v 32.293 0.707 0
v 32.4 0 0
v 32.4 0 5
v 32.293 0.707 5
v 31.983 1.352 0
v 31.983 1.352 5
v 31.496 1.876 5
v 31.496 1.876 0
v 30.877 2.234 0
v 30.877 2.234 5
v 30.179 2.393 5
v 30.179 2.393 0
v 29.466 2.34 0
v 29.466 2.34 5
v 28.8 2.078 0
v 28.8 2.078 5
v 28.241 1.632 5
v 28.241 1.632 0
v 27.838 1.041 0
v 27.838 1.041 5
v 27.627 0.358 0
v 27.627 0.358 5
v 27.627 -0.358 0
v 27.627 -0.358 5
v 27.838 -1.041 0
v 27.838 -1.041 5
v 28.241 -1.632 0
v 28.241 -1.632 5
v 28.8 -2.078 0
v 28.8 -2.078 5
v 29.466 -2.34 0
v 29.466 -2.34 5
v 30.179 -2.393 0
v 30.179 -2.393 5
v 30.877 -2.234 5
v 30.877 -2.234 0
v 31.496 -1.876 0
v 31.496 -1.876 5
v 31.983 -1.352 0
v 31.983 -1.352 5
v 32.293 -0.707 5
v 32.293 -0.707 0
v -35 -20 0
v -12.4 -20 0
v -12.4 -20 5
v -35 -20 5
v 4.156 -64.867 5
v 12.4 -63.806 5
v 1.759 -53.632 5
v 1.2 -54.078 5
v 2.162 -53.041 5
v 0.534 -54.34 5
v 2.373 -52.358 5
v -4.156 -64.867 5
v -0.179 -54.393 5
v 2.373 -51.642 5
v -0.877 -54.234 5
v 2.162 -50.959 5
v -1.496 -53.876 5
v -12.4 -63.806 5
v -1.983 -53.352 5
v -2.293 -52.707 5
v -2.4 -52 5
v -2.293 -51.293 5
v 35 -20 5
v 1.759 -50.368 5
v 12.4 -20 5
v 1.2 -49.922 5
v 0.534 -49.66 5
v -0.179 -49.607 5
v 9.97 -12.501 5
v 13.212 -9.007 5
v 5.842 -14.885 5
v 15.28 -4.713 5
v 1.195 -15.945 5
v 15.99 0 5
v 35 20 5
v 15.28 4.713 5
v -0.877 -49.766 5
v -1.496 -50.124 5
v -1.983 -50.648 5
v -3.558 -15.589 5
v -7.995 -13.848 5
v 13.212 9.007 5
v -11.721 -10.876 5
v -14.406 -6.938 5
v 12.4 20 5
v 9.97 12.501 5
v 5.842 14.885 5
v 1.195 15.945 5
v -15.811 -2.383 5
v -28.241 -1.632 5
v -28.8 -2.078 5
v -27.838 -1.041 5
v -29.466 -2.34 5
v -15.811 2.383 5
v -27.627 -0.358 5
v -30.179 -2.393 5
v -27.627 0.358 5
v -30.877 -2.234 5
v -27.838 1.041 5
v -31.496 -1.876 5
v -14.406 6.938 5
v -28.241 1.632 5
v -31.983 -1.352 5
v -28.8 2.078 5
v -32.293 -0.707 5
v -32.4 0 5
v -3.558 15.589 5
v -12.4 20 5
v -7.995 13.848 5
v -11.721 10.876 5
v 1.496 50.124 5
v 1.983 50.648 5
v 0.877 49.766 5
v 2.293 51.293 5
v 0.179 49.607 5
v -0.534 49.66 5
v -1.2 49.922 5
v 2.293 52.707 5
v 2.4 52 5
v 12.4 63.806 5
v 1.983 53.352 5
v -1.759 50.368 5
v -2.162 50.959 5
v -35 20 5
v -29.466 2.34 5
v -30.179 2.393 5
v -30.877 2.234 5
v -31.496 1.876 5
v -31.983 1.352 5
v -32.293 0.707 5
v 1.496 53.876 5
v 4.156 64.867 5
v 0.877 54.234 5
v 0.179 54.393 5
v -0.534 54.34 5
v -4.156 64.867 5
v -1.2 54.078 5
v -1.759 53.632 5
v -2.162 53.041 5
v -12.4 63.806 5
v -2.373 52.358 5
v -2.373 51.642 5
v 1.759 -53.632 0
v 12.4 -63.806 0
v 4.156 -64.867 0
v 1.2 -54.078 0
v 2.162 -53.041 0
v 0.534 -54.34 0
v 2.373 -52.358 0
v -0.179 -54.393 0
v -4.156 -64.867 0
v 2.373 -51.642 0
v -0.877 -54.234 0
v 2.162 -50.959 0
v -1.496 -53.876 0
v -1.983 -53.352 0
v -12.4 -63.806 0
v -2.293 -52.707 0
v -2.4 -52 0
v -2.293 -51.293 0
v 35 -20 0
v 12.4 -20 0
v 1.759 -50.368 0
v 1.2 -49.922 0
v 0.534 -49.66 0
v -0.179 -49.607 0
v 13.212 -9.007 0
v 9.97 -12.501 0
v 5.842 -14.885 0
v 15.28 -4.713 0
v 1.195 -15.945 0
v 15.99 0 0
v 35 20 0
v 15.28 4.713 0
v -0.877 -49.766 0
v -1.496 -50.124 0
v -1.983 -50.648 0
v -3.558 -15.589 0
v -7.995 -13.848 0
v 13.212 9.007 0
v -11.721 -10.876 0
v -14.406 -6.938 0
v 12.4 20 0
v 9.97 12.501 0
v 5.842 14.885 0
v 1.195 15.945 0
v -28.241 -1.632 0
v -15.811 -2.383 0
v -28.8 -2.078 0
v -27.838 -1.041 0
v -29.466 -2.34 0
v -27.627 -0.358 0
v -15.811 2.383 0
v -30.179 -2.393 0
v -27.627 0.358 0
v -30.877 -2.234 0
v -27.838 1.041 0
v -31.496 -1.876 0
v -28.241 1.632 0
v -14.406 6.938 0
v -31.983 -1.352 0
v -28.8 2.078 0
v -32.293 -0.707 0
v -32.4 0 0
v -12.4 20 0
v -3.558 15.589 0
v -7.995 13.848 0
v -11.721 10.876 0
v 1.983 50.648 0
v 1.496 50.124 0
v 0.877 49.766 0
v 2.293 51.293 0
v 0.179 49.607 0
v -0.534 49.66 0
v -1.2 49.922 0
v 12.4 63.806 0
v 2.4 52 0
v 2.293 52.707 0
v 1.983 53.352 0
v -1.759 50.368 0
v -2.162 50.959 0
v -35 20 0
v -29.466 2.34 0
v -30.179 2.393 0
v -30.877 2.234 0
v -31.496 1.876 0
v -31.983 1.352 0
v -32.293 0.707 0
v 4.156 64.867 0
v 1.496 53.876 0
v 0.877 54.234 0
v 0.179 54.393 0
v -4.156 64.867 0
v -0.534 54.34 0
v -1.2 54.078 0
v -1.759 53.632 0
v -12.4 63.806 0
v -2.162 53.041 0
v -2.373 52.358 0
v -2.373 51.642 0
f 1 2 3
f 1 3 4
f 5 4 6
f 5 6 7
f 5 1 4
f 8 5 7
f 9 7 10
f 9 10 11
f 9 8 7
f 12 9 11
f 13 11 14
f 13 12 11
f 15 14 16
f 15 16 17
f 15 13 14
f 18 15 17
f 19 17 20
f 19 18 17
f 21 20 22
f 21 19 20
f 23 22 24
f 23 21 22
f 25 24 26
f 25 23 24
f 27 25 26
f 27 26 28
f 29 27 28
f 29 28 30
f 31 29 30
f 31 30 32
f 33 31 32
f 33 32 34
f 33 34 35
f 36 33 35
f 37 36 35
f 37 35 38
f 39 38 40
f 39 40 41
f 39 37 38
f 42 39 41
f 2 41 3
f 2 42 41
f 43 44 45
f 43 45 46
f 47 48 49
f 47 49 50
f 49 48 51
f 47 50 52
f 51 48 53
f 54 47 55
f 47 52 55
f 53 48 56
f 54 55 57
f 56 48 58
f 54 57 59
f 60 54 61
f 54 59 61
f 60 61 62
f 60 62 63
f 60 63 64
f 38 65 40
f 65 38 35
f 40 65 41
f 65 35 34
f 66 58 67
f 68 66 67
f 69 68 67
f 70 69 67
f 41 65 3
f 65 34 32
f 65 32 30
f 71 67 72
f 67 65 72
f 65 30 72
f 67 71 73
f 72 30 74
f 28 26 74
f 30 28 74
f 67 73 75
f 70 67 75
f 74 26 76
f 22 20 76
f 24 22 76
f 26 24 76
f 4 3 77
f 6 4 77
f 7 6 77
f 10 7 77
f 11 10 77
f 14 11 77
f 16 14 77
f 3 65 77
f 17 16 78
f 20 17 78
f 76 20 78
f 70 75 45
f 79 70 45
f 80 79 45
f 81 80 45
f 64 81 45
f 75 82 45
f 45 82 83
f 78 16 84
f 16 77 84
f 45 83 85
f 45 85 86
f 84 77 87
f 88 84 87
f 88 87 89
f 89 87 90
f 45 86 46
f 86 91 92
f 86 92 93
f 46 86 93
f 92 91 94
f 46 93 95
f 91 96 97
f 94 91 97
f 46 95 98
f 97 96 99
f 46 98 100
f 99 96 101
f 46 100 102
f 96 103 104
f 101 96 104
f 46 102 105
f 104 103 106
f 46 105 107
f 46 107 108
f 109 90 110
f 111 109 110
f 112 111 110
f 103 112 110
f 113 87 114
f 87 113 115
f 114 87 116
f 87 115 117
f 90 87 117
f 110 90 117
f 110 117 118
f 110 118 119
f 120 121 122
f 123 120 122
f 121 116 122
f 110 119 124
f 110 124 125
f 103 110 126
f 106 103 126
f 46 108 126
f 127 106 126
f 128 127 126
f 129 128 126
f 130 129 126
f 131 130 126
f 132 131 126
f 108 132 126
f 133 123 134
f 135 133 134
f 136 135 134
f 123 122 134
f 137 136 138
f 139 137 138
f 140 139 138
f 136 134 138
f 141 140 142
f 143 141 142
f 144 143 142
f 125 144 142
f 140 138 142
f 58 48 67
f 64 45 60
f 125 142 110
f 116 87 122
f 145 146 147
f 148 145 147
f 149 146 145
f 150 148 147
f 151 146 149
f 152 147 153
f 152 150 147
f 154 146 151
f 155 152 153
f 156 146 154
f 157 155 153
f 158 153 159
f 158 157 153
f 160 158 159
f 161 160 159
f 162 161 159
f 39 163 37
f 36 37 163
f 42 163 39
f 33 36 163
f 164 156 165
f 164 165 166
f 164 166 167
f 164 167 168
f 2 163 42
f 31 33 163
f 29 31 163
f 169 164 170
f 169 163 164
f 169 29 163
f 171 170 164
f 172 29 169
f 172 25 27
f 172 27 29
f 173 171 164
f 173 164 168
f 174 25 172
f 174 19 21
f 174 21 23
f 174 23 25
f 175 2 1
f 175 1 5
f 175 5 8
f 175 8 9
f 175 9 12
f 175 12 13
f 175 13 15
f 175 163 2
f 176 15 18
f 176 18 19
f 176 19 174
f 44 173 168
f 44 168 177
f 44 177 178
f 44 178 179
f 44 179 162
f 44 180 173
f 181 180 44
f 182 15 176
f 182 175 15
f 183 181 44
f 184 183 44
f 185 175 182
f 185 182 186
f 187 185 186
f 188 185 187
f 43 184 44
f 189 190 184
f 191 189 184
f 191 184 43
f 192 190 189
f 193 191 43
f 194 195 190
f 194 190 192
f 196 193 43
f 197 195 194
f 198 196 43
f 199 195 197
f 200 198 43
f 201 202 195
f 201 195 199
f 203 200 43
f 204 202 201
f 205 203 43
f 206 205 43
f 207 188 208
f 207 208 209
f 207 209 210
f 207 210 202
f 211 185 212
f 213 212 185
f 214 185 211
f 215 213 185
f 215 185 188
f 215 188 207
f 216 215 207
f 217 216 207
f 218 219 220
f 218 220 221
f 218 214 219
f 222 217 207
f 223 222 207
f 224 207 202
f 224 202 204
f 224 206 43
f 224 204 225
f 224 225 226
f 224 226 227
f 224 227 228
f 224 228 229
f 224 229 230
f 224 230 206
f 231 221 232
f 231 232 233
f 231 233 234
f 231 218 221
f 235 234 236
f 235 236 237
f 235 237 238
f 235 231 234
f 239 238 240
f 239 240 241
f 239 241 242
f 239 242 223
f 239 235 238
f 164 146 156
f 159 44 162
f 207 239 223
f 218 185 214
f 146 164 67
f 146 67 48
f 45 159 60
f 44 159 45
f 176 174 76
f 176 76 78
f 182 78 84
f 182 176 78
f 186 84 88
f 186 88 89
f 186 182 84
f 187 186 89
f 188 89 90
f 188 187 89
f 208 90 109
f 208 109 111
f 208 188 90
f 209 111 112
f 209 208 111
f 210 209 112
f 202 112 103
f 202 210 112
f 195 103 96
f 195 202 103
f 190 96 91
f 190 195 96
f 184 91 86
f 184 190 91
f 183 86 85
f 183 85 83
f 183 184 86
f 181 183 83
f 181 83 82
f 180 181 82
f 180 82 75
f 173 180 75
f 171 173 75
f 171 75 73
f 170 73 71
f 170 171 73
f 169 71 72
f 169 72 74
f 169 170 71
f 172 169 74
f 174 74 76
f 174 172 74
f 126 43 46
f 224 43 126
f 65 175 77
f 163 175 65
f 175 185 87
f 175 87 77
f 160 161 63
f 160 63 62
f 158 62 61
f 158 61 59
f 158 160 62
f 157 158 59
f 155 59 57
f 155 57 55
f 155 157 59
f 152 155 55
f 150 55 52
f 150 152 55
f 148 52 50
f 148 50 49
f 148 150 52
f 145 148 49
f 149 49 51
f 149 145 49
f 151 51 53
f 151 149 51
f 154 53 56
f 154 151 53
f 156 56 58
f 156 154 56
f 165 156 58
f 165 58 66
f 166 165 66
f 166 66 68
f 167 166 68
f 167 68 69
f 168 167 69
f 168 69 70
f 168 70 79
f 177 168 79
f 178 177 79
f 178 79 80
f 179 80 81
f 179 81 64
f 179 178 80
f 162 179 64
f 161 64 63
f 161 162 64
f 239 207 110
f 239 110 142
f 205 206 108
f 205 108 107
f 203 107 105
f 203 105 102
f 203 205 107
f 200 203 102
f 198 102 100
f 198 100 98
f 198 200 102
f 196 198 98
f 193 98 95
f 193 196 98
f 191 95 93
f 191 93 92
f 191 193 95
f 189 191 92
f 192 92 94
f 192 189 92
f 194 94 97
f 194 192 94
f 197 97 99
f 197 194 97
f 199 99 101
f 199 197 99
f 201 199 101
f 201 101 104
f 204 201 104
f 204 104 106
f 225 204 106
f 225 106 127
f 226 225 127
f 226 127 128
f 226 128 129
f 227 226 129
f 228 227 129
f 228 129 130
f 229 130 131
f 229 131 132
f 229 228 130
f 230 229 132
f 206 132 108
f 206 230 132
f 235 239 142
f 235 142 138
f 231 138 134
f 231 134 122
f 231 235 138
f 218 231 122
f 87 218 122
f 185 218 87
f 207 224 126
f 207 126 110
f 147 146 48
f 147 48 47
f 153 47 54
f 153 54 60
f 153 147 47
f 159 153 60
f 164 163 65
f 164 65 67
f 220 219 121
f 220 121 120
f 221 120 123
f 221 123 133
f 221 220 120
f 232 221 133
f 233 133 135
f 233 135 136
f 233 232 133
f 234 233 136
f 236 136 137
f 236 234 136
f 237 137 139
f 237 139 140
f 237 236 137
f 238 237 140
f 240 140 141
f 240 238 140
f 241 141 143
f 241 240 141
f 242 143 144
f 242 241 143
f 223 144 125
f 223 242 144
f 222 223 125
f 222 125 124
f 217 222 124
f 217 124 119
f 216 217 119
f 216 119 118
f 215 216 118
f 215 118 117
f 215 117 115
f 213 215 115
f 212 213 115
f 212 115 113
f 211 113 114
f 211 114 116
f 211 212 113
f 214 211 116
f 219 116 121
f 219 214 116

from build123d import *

# Parameters (mm, degrees)
SKETCH1_R           = 15.99
SKETCH1_R_2         = 2.4
BOSS_EXTRUDE1_DEPTH = 5


with BuildPart() as part:
    # Sketch1 → Boss-Extrude1 (new body)
    with BuildSketch(Plane.XY):
        with BuildLine():
            Line((12.4, 20), (35, 20))
            Line((35, 20), (35, 0))
            Line((35, 0), (35, -20))
            Line((35, -20), (12.4, -20))
            Line((12.4, -20), (12.4, -63.806269284))
            ThreePointArc((12.4, -63.806269284), (0, -65), (-12.4, -63.806269284))
            Line((-12.4, -63.806269284), (-12.4, -20))
            Line((-12.4, -20), (-35, -20))
            Line((-35, -20), (-35, 20))
            Line((-35, 20), (-12.4, 20))
            Line((-12.4, 20), (-12.4, 63.806269284))
            ThreePointArc((-12.4, 63.806269284), (0, 65), (12.4, 63.806269284))
            Line((12.4, 63.806269284), (12.4, 20))
        make_face()
        Circle(SKETCH1_R, mode=Mode.SUBTRACT)
        with Locations((0, 52)):
            Circle(SKETCH1_R_2, mode=Mode.SUBTRACT)
        with Locations((30, 0)):
            Circle(SKETCH1_R_2, mode=Mode.SUBTRACT)
        with Locations(Location((0, -52, 0), (0, 0, 180))):
            Circle(SKETCH1_R_2, mode=Mode.SUBTRACT)
        with Locations(Location((-30, 0, 0), (0, 0, 180))):
            Circle(SKETCH1_R_2, mode=Mode.SUBTRACT)
    extrude(amount=BOSS_EXTRUDE1_DEPTH)


solid = part.part
